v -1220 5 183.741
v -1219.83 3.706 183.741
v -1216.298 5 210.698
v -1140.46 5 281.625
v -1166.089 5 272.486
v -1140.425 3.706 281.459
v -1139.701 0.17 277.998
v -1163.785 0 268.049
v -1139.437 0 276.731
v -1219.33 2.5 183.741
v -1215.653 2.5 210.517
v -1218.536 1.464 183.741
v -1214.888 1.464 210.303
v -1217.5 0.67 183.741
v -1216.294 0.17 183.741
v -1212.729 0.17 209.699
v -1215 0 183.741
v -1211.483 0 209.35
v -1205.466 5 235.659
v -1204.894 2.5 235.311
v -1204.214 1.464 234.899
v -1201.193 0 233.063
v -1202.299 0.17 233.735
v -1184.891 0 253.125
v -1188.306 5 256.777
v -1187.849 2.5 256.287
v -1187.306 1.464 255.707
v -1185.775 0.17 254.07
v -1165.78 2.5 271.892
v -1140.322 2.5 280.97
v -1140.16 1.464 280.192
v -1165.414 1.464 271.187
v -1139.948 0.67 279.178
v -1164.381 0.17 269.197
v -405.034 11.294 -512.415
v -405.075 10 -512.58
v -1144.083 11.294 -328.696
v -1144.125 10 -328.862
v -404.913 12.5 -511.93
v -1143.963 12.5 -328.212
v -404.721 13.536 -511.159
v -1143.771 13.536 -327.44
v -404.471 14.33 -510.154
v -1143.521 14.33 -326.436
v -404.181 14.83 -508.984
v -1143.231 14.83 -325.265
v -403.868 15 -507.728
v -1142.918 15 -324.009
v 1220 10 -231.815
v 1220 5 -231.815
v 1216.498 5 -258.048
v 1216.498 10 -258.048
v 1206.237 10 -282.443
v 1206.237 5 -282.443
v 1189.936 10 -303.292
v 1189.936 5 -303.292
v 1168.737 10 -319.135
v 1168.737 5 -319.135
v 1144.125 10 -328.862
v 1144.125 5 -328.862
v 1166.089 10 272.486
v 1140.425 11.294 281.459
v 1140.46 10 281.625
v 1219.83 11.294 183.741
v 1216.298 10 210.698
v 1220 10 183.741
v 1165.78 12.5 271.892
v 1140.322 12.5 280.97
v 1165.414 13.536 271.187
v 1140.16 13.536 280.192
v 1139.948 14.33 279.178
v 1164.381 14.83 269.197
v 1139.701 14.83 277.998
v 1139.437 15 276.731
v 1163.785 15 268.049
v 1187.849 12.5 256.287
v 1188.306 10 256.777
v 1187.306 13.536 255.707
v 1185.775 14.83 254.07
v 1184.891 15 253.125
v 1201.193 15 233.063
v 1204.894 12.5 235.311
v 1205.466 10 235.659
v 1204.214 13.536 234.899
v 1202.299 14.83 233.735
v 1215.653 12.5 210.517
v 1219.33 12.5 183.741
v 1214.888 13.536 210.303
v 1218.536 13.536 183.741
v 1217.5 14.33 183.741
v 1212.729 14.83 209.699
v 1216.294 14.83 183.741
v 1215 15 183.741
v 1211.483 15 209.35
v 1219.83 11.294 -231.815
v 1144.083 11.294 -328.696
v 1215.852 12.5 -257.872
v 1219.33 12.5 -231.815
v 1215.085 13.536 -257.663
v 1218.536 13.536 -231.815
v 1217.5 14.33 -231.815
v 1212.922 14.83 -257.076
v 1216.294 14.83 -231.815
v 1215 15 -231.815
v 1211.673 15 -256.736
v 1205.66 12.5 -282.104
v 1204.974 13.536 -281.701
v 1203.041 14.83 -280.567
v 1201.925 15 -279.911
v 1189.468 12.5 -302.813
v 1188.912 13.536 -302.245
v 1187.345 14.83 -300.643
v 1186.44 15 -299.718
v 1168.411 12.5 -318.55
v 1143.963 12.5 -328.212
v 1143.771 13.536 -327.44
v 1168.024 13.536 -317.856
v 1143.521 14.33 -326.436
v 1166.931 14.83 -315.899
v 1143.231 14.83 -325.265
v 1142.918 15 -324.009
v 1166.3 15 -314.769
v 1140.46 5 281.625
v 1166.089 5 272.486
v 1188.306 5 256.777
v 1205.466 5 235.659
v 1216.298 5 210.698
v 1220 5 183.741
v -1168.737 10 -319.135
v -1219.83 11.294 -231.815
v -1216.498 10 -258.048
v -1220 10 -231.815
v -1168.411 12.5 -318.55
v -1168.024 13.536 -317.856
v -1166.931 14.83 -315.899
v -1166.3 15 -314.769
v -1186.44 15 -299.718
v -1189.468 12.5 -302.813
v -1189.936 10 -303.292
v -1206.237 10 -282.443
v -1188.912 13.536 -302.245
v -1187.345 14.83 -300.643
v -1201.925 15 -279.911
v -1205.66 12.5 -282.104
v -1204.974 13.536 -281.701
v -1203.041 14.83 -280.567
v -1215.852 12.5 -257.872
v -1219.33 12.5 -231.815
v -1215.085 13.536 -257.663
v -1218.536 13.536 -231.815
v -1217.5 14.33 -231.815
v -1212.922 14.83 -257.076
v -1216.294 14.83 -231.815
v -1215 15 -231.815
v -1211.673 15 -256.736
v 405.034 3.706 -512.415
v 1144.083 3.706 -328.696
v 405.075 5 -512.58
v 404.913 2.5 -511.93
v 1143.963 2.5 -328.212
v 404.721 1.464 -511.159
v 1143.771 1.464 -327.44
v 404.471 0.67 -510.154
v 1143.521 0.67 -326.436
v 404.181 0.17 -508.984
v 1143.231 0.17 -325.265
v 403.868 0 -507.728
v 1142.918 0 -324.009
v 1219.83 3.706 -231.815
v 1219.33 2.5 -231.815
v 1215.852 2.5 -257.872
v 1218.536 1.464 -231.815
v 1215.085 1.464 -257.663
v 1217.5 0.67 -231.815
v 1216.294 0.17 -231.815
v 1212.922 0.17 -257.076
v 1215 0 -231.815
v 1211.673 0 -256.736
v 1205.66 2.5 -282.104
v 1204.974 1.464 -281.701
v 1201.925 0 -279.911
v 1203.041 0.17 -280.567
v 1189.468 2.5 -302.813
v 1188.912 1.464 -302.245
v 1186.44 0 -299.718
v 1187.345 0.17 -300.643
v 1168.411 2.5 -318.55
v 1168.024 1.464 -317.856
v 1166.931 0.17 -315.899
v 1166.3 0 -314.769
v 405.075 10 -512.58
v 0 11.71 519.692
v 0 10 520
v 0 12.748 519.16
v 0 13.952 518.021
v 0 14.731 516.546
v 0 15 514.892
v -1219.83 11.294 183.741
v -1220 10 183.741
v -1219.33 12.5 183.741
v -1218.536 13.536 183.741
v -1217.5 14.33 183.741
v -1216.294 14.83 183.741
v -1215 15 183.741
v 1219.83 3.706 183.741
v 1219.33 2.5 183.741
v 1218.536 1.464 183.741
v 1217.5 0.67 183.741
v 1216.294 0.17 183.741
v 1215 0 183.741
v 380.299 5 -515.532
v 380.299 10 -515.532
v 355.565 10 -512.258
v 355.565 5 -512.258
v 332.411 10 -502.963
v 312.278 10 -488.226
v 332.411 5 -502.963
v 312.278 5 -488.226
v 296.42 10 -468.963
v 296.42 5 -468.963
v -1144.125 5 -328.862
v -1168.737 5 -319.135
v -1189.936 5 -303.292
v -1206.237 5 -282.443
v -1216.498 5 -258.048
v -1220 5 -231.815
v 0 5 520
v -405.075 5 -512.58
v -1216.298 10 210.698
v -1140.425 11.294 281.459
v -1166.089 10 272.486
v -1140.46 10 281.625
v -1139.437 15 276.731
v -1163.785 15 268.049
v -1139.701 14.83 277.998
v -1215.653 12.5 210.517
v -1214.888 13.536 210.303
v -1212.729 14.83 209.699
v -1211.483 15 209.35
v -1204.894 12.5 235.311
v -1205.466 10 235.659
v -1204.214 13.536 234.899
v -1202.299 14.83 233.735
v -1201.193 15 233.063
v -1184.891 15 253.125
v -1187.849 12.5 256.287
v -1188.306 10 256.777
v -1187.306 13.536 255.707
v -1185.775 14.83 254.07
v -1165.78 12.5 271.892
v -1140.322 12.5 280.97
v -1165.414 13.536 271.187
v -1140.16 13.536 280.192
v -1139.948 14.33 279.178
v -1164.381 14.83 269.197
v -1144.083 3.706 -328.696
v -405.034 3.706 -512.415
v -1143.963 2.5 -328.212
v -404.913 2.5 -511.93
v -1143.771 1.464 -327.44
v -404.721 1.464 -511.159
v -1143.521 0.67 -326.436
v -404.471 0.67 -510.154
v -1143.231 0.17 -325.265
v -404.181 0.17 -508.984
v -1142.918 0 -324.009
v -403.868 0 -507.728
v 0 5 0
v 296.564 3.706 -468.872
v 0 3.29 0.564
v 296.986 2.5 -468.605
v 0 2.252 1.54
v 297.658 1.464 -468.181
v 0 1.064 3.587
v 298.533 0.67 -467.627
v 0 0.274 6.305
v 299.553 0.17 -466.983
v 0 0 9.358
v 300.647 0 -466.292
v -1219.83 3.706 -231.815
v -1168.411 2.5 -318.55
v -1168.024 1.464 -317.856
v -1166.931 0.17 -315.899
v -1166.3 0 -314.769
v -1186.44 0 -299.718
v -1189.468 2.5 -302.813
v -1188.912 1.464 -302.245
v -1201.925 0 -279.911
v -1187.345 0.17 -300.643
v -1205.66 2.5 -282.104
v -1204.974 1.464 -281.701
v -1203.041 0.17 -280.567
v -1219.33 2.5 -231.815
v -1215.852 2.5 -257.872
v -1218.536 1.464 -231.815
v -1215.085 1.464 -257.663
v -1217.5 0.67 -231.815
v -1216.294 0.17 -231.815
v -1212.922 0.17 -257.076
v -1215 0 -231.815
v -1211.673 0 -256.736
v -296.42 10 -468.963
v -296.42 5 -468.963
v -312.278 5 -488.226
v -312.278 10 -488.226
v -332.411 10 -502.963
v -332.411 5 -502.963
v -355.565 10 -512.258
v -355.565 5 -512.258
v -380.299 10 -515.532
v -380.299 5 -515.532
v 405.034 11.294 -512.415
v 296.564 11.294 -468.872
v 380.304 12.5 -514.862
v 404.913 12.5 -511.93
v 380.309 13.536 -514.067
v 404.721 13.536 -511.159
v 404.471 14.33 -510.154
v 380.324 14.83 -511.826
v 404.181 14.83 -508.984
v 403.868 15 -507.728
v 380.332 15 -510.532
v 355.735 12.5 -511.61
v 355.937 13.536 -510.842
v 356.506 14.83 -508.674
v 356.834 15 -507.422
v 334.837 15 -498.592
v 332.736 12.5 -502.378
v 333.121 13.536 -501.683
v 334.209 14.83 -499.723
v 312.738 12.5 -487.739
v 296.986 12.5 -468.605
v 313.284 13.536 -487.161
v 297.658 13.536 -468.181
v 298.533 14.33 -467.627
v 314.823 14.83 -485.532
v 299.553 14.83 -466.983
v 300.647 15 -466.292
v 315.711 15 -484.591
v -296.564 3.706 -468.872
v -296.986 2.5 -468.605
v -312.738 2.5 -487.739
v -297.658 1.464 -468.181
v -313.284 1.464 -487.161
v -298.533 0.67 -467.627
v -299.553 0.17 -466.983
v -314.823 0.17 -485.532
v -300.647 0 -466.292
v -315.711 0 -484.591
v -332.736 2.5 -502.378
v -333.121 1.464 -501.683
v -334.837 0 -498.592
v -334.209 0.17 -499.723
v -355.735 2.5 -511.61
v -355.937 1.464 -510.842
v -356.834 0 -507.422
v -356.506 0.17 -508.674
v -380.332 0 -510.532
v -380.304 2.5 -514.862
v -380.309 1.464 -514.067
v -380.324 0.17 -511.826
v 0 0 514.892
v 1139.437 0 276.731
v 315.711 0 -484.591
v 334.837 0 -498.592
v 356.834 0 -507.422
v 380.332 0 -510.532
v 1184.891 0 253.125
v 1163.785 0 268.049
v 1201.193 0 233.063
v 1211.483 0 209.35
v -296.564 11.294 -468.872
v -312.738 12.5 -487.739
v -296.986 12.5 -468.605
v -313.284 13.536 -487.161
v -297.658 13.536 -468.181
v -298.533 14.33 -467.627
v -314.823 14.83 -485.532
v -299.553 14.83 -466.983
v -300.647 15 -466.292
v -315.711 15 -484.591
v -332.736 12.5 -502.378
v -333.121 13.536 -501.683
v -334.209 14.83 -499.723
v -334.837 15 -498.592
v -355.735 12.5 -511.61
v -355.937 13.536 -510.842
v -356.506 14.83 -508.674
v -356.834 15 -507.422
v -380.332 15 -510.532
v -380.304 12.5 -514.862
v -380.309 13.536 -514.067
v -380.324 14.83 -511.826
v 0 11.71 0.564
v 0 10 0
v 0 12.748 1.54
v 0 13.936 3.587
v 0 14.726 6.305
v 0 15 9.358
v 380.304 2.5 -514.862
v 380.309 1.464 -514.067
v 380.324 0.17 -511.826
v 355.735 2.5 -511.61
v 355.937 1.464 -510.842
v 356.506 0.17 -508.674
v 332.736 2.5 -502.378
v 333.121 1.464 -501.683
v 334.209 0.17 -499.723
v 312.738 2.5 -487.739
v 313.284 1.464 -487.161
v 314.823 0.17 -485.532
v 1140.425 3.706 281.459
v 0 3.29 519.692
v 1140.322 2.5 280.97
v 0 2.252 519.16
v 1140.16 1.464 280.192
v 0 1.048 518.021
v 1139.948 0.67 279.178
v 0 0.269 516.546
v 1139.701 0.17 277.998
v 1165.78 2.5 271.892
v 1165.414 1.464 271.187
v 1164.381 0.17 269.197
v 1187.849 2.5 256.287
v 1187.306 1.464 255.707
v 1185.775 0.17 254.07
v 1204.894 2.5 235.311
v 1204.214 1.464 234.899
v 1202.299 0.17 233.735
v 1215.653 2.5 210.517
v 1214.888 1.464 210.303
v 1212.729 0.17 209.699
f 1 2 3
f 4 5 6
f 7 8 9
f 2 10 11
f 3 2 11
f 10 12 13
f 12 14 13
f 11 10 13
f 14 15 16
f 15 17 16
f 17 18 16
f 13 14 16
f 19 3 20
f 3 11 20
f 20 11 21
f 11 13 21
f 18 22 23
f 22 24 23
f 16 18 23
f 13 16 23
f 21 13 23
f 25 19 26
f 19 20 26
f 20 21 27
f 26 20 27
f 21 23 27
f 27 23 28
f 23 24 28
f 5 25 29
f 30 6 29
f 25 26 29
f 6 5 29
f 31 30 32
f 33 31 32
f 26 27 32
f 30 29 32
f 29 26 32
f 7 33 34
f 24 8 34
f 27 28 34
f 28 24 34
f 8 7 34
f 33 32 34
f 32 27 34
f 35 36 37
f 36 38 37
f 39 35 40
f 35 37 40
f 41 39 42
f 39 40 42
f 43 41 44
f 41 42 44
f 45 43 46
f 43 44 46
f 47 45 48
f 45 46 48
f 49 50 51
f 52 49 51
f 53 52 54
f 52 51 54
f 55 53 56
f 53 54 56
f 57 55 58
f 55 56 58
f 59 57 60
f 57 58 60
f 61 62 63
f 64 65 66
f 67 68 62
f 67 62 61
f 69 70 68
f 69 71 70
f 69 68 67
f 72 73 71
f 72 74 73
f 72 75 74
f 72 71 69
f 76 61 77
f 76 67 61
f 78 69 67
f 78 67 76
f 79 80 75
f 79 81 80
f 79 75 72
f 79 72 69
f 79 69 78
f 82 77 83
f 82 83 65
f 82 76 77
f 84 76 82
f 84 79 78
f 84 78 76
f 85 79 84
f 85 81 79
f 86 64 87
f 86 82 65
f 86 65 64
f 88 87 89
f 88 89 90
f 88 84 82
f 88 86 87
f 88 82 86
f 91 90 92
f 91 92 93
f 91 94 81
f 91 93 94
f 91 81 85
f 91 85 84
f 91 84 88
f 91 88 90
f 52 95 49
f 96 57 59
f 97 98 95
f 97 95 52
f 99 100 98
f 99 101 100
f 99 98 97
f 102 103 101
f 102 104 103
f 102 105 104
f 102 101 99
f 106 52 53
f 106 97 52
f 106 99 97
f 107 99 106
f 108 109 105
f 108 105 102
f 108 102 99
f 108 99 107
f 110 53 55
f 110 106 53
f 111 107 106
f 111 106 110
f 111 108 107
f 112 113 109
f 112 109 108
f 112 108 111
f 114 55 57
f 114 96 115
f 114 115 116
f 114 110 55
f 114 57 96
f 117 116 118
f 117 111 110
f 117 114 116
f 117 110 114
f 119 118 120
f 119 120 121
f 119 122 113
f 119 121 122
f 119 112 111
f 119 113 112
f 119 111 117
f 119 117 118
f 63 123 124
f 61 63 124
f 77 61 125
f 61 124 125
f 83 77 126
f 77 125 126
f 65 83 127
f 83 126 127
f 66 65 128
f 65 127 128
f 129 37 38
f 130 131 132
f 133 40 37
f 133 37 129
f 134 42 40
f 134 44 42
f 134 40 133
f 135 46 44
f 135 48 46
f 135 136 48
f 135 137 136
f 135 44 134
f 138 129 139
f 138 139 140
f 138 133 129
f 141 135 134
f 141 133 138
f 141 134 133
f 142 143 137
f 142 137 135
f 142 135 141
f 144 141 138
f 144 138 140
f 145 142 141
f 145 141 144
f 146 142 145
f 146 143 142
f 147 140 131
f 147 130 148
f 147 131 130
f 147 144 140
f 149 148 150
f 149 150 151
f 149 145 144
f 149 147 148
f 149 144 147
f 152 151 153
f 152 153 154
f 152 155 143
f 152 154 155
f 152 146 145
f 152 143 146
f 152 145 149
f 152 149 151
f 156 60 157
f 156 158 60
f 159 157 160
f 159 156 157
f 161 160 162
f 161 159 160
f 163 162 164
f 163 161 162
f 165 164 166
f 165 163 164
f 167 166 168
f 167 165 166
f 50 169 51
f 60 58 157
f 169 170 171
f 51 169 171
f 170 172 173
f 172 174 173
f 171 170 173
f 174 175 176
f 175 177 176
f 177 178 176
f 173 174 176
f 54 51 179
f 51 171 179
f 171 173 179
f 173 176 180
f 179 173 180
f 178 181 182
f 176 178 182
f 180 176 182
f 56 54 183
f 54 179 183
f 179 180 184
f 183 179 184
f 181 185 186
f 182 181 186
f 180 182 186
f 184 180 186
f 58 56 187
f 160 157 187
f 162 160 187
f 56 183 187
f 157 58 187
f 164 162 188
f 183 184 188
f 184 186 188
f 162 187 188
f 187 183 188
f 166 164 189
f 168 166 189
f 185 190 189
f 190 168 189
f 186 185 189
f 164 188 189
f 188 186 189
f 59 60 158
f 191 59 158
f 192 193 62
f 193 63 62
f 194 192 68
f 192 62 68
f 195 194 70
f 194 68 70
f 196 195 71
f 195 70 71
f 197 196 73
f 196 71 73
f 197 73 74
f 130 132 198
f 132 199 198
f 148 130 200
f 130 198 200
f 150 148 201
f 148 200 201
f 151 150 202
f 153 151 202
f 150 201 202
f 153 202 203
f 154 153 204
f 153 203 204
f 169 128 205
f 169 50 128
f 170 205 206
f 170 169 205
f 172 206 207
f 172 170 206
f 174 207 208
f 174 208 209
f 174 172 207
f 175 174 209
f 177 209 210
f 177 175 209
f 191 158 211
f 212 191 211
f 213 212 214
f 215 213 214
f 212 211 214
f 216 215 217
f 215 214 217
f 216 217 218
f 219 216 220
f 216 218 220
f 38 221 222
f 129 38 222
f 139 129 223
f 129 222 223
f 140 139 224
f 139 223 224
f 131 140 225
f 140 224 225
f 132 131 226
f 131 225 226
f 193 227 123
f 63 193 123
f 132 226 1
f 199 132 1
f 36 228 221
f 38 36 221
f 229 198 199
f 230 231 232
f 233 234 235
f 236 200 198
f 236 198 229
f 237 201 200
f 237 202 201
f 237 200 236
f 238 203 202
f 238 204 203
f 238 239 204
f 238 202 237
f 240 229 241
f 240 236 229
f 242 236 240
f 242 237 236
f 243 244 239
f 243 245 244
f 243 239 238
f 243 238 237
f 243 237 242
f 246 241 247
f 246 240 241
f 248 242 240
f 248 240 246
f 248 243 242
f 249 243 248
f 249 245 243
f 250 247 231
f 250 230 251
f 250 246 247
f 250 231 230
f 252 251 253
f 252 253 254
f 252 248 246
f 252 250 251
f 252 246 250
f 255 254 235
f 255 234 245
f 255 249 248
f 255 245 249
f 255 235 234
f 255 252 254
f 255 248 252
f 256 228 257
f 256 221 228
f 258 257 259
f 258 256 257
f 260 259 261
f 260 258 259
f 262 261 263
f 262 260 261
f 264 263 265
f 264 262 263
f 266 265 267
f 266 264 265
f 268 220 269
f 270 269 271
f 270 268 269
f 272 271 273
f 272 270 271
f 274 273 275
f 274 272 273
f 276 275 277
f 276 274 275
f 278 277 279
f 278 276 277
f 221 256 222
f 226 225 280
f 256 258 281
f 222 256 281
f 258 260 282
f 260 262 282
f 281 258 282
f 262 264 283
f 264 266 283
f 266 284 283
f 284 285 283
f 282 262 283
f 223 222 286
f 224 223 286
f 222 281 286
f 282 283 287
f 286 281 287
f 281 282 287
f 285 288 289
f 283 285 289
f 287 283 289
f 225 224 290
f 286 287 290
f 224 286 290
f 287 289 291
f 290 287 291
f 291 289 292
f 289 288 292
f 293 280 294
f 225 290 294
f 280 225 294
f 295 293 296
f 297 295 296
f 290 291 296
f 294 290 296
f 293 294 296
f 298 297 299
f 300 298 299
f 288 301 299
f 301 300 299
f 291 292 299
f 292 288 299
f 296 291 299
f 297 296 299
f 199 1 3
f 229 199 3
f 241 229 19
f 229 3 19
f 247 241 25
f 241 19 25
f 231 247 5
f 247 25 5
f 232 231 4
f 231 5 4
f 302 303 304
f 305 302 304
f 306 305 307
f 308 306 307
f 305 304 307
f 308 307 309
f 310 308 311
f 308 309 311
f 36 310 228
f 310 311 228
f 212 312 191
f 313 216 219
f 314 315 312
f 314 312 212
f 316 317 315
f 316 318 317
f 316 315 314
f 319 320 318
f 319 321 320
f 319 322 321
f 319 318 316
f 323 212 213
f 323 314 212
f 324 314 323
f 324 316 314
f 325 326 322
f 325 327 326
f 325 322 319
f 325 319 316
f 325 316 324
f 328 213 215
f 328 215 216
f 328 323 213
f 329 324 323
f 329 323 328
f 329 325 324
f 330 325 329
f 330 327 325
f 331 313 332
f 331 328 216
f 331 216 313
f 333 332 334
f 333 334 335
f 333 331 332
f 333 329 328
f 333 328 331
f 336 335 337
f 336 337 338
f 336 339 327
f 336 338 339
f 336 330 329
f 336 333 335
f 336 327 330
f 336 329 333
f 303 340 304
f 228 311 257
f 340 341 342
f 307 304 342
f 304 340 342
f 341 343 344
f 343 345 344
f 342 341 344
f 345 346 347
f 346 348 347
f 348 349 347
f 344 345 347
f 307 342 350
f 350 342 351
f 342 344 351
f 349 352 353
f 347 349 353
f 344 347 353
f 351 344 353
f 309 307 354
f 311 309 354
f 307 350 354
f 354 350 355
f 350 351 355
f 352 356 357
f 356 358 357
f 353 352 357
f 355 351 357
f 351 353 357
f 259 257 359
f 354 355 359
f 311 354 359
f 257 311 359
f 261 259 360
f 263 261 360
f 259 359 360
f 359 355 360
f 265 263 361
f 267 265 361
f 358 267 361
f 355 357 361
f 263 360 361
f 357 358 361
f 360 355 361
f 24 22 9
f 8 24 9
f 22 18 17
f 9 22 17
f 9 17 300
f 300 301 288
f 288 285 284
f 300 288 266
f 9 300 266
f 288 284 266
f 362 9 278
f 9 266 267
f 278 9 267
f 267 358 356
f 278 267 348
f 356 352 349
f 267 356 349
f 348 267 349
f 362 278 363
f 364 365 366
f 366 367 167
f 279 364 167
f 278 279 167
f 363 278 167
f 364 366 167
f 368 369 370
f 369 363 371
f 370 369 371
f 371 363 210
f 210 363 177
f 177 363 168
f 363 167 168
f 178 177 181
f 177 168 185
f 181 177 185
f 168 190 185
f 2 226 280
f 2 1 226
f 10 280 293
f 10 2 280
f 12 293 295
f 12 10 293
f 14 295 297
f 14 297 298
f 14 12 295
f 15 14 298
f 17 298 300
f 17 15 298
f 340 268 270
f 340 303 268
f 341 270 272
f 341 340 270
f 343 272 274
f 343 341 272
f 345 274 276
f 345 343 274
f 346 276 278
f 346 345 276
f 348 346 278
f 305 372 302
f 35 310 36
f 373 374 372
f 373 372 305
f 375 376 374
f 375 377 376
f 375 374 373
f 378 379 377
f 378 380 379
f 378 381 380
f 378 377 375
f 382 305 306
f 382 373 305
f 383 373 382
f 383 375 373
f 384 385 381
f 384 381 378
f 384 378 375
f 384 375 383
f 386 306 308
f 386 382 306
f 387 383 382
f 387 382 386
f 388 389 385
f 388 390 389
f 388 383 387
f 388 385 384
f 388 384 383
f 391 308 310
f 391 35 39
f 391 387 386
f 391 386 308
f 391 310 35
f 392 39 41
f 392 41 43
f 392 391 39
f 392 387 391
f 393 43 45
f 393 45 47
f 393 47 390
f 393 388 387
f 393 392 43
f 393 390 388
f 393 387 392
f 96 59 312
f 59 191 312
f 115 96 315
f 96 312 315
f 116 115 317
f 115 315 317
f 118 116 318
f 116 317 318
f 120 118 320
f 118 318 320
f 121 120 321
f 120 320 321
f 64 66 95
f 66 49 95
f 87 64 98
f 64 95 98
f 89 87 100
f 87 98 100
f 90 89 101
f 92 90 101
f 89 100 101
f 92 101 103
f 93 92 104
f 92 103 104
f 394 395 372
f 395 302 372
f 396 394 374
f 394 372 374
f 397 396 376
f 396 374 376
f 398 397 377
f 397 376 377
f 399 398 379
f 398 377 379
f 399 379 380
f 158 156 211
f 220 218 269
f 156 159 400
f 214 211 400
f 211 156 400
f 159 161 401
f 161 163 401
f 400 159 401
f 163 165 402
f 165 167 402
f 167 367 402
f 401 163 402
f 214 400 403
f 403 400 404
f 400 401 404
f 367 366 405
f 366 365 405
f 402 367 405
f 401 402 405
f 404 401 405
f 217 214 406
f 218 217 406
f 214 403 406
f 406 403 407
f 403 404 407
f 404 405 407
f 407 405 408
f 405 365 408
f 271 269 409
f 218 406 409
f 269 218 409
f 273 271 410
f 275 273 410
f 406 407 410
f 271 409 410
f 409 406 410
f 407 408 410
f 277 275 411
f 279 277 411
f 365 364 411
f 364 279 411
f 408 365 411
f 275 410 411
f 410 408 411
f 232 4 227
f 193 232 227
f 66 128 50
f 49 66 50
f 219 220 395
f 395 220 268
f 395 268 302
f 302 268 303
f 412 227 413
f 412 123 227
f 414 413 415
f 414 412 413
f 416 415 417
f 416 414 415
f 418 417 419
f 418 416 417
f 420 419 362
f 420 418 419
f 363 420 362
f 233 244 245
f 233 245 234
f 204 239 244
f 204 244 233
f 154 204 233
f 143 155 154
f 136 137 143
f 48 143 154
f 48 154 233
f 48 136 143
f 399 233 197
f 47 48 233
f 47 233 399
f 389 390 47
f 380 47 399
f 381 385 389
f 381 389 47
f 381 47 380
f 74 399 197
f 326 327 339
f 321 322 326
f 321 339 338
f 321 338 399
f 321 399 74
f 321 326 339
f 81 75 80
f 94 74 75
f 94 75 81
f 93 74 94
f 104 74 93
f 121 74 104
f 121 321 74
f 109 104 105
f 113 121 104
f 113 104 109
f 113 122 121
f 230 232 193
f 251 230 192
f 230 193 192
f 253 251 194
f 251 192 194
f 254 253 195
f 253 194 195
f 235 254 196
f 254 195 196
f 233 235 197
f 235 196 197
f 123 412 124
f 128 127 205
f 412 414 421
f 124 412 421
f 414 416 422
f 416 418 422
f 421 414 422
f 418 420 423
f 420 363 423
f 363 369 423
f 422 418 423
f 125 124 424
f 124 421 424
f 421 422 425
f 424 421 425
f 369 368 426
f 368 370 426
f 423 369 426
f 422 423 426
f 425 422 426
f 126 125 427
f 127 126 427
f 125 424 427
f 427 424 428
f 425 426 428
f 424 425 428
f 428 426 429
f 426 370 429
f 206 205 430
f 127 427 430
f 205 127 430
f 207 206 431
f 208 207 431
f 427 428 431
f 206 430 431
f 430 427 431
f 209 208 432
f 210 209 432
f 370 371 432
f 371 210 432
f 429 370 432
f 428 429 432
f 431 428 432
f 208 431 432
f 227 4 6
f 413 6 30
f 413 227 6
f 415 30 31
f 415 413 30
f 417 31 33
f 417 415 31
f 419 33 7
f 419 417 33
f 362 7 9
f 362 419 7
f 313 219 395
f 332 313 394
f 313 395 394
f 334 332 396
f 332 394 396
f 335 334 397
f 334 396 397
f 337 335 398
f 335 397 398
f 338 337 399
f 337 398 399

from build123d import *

# Parameters (mm, degrees)
BOSS_EXTRUDE1_DEPTH = 15
FILLET1_R           = 5


with BuildPart() as part:
    # Sketch1 → Boss-Extrude1 (new body)
    with BuildSketch(Plane(origin=(0, 0, 0), x_dir=(1, 0, 0), z_dir=(0, 1, 0))):
        with BuildLine():
            Line((0, 0), (-296.420139667, 468.96320604))
            ThreePointArc((-296.420139667, 468.96320604), (-343.696667359, 508.335758373), (-405.074608149, 512.580323398))
            Line((-405.074608149, 512.580323398), (-1144.124532862, 328.861698046))
            ThreePointArc((-1144.124532862, 328.861698046), (-1198.779608041, 293.408896337), (-1220, 231.815281758))
            Line((-1220, 231.815281758), (-1220, -183.740597223))
            ThreePointArc((-1220, -183.740597223), (-1197.607828507, -246.804255176), (-1140.459500912, -281.625268252))
            Line((-1140.459500912, -281.625268252), (0, -520))
            Line((0, -520), (1140.459500912, -281.625268252))
            ThreePointArc((1140.459500912, -281.625268252), (1197.607828507, -246.804255176), (1220, -183.740597223))
            Line((1220, -183.740597223), (1220, 231.815281758))
            ThreePointArc((1220, 231.815281758), (1198.779608041, 293.408896337), (1144.124532862, 328.861698046))
            Line((1144.124532862, 328.861698046), (405.074608149, 512.580323398))
            ThreePointArc((405.074608149, 512.580323398), (343.696667359, 508.335758373), (296.420139667, 468.96320604))
            Line((296.420139667, 468.96320604), (0, 0))
        make_face()
    extrude(amount=BOSS_EXTRUDE1_DEPTH)

    # Fillet1
    fillet1_edges = [part.edges().sort_by_distance(p)[0] for p in [
        (-343.696667359, 15, -508.335758373),
        (343.696667359, 0, -508.335758373),
        (774.599570506, 0, -420.721010722),
        (1198.779608041, 0, -293.408896337),
        (1220, 0, -24.037342268),
        (1197.607828507, 0, 246.804255176),
        (570.229750456, 0, 400.812634126),
        (-570.229750456, 0, 400.812634126),
        (-1197.607828507, 0, 246.804255176),
        (-774.599570506, 15, -420.721010722),
        (-1220, 0, -24.037342268),
        (-1198.779608041, 0, -293.408896337),
        (-774.599570506, 0, -420.721010722),
        (-343.696667359, 0, -508.335758373),
        (-148.210069834, 0, -234.48160302),
        (148.210069834, 0, -234.48160302),
        (-1198.779608041, 15, -293.408896337),
        (-1220, 15, -24.037342268),
        (-1197.607828507, 15, 246.804255176),
        (-570.229750456, 15, 400.812634126),
        (570.229750456, 15, 400.812634126),
        (1197.607828507, 15, 246.804255176),
        (1220, 15, -24.037342268),
        (1198.779608041, 15, -293.408896337),
        (148.210069834, 15, -234.48160302),
        (774.599570506, 15, -420.721010722),
        (343.696667359, 15, -508.335758373),
        (-148.210069834, 15, -234.48160302),
    ]]
    fillet(fillet1_edges, radius=FILLET1_R)


solid = part.part
